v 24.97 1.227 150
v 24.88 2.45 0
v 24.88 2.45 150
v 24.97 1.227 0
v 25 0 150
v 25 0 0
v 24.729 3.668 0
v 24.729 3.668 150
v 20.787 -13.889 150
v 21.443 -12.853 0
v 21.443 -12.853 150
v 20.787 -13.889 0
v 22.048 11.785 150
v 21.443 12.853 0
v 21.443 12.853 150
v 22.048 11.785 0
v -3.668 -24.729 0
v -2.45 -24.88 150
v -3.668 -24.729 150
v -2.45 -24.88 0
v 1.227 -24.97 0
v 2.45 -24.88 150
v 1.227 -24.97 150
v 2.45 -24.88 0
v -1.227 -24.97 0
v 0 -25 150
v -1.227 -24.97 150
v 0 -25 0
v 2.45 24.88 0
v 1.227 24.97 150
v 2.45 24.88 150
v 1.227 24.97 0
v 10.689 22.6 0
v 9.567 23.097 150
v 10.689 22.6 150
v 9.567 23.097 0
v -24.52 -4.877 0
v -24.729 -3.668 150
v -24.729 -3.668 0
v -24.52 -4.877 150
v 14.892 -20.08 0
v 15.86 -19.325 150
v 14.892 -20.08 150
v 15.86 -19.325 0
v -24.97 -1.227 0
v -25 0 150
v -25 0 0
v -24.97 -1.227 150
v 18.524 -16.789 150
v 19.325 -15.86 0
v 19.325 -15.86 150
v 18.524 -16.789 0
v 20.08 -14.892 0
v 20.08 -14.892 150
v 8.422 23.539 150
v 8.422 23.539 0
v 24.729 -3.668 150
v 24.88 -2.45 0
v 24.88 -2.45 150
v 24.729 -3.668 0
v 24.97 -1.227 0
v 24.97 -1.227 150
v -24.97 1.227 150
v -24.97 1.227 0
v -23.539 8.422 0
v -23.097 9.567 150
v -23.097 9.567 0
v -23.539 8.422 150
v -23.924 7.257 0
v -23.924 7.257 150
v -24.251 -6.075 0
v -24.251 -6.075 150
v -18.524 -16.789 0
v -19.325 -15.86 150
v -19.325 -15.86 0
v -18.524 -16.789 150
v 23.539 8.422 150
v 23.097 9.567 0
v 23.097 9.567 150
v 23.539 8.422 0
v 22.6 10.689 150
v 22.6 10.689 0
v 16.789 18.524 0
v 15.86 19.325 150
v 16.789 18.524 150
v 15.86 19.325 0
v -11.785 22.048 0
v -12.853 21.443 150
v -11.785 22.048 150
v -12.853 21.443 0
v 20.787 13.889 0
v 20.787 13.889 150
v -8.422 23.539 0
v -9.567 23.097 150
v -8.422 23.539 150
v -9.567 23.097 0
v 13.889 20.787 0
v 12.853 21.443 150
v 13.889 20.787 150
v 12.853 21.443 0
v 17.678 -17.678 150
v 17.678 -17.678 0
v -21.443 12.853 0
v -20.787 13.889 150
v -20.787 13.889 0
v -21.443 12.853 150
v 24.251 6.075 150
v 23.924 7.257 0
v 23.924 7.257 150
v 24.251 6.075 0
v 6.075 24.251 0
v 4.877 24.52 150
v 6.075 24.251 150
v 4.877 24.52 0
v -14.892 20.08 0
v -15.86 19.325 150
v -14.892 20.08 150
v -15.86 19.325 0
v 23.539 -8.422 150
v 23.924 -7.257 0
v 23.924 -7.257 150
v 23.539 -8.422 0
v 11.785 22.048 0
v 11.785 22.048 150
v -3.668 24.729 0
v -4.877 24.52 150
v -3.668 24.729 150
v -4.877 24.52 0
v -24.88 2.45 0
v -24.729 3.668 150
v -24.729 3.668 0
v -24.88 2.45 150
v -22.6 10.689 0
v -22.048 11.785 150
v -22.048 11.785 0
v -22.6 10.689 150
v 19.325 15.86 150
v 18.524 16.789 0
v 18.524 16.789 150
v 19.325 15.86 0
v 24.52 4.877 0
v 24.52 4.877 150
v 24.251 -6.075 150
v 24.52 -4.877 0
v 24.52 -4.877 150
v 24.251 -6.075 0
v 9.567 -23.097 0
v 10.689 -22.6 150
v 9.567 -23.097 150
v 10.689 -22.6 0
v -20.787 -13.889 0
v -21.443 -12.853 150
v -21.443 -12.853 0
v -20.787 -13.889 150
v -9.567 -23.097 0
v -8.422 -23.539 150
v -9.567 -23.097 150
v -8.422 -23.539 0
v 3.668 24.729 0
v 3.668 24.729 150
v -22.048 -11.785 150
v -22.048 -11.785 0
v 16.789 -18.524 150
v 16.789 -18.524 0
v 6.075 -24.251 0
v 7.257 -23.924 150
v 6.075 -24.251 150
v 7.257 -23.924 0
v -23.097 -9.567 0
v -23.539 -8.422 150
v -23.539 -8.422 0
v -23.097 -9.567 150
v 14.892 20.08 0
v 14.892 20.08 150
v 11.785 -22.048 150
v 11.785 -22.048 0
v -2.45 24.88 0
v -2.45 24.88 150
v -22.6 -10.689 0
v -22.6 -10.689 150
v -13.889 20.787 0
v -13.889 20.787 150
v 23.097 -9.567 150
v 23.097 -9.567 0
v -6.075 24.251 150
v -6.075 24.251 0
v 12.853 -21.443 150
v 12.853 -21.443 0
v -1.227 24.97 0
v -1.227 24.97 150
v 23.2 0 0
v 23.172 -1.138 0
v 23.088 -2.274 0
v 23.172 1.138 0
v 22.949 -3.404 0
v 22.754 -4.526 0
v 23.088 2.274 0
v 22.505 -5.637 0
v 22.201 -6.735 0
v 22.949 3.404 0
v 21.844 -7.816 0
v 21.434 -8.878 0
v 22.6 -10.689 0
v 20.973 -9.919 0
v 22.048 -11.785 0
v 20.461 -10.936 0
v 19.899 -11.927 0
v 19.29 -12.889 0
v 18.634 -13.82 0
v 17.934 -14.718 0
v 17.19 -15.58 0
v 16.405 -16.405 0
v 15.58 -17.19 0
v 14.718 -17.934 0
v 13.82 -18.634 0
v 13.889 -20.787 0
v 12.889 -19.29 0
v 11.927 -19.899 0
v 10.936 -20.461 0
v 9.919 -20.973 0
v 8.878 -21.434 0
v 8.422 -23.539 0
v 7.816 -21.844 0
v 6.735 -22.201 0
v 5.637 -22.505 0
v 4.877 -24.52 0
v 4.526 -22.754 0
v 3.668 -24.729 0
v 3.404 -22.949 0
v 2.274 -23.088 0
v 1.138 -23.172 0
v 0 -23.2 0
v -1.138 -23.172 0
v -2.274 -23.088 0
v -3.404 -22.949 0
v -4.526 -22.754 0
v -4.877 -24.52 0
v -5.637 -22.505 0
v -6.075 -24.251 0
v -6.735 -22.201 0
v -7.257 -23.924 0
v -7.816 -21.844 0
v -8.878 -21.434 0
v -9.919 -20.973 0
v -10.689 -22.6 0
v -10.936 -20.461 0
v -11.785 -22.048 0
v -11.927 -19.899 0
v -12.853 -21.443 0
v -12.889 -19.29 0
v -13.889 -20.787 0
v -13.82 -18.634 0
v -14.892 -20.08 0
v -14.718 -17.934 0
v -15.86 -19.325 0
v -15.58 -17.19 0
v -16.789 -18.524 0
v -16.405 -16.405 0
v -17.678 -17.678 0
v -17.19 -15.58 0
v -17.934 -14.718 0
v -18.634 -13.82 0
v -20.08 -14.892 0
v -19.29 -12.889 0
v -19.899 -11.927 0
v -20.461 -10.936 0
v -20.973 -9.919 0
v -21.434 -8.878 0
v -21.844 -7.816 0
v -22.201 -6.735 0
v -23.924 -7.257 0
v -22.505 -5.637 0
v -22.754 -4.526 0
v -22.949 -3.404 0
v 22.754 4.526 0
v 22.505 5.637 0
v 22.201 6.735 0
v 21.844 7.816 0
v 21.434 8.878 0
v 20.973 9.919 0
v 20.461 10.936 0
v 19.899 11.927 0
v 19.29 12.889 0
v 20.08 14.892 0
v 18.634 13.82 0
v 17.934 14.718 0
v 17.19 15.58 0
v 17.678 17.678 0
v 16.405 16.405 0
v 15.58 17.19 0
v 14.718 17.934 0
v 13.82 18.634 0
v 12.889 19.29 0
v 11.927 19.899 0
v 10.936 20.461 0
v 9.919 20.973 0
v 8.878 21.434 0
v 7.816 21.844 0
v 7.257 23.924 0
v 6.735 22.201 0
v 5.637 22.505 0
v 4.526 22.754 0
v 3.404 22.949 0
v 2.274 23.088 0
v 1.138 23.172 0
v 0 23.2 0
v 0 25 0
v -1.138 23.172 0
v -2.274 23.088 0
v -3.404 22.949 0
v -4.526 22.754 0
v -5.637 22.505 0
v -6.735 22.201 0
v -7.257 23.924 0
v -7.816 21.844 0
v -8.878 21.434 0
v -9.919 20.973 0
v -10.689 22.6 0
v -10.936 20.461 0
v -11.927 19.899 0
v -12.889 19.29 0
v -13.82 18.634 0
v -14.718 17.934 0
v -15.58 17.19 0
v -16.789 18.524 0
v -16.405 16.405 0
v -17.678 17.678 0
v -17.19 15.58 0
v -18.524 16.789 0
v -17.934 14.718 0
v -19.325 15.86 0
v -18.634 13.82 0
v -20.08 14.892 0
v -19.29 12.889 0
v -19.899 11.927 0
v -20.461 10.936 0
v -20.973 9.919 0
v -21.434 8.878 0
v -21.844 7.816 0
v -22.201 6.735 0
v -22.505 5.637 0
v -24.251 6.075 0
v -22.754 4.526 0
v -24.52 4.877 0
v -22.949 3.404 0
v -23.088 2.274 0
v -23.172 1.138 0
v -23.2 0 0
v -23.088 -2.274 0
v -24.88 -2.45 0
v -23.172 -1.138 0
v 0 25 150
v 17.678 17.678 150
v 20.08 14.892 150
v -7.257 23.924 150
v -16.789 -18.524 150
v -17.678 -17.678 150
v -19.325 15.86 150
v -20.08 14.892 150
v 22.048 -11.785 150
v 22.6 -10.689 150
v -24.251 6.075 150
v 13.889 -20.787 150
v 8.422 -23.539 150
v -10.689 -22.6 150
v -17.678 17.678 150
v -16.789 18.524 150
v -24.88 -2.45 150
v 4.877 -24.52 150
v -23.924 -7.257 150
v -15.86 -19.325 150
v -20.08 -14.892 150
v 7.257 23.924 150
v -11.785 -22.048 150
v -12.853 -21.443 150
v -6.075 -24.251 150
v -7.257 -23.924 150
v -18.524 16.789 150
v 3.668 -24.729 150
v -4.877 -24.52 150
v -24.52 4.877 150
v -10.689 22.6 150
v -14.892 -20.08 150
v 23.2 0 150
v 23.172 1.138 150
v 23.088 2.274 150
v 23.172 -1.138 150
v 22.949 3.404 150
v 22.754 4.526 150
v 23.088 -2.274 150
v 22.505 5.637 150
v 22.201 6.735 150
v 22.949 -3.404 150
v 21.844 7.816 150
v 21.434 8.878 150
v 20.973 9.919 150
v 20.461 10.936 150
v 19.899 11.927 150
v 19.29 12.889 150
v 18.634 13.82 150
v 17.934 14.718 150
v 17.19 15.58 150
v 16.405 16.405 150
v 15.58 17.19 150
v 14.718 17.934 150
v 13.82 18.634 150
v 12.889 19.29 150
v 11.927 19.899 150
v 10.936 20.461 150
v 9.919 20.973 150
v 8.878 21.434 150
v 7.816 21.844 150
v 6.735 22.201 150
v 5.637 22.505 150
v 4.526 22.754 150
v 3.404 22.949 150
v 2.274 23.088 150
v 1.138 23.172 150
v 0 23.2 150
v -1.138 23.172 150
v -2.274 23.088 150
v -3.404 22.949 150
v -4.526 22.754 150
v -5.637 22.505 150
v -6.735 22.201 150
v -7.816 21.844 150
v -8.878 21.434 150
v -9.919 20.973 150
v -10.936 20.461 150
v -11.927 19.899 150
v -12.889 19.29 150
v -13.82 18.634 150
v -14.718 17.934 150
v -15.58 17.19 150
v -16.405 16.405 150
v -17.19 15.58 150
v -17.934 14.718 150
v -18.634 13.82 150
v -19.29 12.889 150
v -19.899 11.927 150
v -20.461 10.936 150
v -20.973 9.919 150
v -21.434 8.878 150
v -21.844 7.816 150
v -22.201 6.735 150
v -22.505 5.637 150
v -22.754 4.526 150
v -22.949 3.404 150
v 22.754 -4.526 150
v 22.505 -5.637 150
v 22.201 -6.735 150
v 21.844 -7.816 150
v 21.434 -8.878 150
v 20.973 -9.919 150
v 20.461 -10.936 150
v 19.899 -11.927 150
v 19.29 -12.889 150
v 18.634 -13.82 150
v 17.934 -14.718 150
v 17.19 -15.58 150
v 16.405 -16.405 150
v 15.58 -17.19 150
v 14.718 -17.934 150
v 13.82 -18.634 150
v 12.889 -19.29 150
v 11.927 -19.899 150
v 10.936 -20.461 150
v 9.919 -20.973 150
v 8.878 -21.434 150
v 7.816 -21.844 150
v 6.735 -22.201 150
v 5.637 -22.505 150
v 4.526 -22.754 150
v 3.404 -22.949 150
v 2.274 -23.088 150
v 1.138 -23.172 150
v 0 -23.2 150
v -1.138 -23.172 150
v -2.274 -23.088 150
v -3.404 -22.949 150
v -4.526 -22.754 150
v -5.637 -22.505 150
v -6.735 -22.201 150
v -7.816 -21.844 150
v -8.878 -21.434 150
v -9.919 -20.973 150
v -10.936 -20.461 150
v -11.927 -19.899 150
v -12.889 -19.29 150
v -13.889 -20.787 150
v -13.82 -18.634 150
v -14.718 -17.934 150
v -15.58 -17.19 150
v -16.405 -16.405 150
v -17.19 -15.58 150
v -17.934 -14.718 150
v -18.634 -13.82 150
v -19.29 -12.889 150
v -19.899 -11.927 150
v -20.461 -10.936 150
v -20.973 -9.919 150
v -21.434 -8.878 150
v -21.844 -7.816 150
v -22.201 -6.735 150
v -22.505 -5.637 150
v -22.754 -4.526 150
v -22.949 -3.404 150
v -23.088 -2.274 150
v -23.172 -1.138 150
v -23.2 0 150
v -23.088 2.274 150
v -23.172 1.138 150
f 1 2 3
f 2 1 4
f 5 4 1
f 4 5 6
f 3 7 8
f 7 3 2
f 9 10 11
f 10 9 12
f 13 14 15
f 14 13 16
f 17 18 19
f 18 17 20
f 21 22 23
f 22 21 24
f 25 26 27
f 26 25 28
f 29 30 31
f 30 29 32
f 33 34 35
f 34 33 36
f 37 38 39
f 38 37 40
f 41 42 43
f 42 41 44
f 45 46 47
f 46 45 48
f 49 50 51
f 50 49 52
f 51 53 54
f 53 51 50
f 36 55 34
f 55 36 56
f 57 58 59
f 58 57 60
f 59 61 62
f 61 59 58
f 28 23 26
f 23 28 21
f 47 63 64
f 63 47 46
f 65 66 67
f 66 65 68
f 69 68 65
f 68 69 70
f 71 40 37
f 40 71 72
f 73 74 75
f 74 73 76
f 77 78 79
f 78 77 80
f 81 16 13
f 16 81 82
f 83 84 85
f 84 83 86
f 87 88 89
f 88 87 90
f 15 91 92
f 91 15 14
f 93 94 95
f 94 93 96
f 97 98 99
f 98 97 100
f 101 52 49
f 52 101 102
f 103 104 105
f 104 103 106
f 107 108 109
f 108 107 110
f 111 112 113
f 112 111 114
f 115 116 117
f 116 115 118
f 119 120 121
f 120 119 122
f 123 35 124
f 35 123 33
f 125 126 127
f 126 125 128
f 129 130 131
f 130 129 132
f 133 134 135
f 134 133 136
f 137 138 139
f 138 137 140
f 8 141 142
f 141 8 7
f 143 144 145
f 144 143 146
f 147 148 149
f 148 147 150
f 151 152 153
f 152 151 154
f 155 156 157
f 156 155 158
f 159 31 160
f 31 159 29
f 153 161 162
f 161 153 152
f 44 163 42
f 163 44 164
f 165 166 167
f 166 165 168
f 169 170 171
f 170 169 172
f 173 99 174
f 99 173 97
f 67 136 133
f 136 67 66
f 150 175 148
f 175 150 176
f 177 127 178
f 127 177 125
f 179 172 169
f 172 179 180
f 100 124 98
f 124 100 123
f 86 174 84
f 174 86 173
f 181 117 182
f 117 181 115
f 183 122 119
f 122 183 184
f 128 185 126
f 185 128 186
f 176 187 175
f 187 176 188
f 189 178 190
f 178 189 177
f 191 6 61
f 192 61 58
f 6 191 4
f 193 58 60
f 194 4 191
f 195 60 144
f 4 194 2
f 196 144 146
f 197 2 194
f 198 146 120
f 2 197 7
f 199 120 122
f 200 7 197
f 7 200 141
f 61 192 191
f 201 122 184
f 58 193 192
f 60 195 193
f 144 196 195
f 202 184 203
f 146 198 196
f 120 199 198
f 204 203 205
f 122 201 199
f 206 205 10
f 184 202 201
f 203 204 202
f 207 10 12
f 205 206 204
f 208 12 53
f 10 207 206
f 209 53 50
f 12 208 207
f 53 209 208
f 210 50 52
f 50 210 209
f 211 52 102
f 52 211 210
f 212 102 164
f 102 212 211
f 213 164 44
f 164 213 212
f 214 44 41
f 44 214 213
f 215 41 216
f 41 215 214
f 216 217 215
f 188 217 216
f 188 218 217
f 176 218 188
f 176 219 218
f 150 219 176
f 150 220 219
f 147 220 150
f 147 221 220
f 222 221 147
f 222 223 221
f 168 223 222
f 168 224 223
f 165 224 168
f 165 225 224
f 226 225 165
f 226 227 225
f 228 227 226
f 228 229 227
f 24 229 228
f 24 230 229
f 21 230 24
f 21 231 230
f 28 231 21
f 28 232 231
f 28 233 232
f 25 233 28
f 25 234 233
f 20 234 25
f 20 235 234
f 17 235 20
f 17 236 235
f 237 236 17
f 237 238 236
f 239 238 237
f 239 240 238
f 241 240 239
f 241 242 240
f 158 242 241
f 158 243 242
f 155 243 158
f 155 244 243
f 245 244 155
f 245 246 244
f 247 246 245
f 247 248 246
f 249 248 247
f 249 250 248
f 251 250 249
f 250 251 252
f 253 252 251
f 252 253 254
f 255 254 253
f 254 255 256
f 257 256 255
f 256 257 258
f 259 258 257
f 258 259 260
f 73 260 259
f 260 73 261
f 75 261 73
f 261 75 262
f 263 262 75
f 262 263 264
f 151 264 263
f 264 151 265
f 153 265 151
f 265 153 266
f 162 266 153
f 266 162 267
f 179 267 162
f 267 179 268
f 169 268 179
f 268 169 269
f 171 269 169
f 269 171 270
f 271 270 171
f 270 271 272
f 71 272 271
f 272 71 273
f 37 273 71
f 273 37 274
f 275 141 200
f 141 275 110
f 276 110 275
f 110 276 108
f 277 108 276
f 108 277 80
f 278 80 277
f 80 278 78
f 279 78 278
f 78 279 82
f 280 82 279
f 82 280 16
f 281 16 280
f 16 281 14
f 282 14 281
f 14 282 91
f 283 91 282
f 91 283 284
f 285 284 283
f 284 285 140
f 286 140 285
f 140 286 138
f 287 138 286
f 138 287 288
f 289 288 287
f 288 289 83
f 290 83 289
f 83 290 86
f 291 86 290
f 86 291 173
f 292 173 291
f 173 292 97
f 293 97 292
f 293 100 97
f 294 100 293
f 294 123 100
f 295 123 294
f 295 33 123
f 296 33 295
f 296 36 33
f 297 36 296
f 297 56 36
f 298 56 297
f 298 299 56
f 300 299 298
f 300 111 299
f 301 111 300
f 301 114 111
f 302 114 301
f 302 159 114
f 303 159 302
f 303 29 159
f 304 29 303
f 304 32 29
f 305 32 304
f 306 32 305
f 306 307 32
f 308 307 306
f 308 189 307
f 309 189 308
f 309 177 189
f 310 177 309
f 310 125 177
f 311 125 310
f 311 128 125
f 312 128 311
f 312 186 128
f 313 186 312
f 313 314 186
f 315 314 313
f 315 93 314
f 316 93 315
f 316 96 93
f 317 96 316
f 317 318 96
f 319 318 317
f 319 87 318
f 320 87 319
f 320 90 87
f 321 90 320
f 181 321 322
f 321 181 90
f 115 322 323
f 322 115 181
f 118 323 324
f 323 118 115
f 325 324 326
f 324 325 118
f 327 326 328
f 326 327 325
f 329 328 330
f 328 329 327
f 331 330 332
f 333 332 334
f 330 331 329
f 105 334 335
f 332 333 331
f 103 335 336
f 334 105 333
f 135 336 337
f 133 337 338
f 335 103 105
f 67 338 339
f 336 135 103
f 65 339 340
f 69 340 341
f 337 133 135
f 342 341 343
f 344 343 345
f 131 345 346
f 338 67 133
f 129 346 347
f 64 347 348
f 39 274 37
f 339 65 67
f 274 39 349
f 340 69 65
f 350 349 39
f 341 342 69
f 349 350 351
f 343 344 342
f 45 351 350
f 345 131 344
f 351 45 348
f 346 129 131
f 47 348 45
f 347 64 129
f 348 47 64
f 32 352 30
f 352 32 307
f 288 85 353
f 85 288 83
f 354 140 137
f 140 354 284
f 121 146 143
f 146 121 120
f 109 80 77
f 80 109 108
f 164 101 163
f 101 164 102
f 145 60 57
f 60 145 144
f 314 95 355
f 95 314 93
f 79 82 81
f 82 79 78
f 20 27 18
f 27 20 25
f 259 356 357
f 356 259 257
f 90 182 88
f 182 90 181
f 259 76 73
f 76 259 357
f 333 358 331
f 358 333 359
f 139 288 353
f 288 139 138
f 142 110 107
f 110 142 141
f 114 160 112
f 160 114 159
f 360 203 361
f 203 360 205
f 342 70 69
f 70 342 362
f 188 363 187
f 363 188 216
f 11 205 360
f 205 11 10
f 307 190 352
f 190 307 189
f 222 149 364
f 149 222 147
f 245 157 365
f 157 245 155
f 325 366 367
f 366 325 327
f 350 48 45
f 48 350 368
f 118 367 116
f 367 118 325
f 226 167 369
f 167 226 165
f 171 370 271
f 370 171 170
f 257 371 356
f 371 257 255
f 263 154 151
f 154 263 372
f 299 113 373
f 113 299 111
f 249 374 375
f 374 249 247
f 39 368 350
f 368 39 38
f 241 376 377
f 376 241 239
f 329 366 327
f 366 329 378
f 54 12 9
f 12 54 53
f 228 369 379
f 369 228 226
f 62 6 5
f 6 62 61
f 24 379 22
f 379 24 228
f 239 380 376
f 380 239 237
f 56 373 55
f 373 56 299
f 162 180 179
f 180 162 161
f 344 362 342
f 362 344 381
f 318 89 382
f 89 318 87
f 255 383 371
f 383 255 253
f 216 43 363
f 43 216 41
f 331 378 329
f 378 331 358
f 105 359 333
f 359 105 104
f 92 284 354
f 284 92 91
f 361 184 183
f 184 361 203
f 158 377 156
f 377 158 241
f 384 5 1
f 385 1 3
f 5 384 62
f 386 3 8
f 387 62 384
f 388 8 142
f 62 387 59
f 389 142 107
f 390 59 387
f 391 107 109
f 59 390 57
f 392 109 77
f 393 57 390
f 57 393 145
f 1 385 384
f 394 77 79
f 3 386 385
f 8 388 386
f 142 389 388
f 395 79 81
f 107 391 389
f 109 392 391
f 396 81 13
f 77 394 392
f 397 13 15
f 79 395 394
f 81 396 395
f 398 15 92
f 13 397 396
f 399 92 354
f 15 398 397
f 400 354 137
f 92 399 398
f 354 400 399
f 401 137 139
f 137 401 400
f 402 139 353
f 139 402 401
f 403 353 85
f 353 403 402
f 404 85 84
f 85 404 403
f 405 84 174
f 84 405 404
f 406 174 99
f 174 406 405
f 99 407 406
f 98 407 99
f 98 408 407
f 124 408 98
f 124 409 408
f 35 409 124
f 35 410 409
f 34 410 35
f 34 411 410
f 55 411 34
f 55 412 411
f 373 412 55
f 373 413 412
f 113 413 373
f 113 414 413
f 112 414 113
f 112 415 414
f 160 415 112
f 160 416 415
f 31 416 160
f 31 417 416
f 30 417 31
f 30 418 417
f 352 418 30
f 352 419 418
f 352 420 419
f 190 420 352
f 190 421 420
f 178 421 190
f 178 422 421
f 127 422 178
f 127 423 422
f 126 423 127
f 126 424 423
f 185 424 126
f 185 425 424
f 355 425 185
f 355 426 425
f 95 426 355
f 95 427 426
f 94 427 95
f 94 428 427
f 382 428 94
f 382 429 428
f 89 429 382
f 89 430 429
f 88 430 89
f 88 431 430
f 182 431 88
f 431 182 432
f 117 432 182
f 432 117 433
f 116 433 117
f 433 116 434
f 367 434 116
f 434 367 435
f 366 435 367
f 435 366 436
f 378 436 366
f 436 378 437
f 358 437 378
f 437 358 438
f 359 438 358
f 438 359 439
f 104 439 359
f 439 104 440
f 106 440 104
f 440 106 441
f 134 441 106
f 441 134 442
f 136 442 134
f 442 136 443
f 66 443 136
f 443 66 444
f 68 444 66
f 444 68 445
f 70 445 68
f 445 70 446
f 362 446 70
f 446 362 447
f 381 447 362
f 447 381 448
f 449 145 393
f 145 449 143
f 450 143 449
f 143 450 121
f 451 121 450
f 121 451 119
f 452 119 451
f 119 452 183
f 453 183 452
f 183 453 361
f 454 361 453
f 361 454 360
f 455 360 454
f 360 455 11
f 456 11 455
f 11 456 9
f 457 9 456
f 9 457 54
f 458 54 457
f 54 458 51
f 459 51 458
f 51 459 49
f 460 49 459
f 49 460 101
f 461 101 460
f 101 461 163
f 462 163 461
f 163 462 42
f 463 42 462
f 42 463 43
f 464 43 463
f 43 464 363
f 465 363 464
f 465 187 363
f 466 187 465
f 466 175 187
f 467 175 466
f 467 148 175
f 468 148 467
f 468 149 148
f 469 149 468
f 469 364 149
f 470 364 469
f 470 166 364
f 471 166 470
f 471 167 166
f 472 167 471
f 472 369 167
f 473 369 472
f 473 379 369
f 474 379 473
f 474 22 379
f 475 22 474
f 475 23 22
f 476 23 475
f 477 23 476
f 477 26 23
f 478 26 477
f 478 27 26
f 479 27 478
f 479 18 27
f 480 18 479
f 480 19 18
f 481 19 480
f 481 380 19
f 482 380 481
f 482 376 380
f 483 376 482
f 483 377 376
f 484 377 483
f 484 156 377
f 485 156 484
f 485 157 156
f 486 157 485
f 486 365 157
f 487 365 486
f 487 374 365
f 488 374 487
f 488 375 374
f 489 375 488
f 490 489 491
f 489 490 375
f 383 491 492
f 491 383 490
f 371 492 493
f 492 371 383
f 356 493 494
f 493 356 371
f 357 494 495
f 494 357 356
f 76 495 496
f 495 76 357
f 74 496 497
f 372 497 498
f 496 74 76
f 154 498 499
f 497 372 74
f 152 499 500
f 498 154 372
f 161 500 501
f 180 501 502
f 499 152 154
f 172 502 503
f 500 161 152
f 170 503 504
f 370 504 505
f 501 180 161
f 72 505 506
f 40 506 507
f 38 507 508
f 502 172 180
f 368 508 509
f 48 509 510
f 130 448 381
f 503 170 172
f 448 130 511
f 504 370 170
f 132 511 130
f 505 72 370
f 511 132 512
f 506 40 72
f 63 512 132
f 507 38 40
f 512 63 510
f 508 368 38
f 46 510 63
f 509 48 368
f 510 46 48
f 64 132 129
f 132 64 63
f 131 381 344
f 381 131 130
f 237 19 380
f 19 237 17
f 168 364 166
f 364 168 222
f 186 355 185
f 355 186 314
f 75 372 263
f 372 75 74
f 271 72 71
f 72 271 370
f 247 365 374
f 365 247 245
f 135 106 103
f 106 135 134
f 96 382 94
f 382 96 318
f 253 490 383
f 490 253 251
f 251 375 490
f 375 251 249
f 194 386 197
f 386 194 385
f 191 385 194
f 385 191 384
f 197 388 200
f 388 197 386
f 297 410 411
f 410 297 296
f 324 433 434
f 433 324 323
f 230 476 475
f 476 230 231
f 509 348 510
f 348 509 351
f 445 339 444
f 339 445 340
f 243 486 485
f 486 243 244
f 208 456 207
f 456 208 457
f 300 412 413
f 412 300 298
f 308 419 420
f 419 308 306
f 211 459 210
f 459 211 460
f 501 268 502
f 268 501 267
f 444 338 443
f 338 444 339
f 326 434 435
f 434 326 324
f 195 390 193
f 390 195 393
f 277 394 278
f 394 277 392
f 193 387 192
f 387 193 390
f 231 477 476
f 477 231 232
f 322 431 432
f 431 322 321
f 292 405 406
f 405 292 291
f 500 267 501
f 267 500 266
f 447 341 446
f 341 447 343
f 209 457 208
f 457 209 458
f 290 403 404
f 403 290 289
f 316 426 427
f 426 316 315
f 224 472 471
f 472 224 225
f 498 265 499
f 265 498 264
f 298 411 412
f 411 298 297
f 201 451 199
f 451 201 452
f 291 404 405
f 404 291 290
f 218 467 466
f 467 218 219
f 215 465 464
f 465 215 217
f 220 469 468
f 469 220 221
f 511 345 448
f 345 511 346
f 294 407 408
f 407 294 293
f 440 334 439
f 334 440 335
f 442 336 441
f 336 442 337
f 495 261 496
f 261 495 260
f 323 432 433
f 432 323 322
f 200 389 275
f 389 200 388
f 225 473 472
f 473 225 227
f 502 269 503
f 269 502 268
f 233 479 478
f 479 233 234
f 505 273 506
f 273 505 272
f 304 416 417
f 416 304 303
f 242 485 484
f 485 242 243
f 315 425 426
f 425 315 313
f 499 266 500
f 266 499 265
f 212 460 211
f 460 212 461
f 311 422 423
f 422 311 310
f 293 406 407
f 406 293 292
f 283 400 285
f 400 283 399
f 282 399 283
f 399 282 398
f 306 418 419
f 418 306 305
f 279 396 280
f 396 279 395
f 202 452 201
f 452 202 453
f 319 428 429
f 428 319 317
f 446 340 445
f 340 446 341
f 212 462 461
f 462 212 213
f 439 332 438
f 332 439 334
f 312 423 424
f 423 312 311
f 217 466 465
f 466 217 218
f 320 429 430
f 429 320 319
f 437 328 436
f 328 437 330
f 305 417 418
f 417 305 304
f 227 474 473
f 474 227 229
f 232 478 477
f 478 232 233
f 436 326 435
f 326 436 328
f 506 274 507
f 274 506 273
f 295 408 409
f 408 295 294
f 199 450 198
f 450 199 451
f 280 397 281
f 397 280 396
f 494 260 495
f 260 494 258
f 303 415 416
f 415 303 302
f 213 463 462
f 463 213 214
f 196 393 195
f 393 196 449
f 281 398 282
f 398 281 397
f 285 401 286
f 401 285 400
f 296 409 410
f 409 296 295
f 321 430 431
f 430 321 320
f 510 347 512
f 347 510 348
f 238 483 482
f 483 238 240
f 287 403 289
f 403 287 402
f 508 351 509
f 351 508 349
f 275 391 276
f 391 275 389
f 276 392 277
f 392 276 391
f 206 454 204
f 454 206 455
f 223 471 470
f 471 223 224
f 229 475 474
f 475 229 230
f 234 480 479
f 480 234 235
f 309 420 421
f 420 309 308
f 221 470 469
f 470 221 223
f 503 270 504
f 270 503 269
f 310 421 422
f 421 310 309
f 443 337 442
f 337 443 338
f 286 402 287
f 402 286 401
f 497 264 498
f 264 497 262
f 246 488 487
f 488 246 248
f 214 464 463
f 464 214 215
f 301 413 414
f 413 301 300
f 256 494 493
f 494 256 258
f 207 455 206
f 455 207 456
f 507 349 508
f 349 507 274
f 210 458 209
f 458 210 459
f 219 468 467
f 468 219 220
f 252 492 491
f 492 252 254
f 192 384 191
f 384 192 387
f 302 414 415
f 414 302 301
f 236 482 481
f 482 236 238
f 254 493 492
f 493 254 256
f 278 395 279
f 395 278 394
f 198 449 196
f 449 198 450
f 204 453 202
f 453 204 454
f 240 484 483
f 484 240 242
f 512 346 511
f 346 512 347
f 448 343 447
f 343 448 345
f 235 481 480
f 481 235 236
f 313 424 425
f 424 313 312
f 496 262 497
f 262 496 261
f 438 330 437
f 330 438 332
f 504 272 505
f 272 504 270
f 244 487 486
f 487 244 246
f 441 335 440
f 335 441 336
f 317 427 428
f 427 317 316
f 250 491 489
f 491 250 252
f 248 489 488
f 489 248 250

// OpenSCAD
$fn = 128;

// HT pipe parameters (approx. for HT 50)
pipe_length = 150;          // mm
outer_diameter = 50;        // mm (nominal)
wall_thickness = 1.8;       // mm (typical HT pipe wall)
inner_diameter = outer_diameter - 2*wall_thickness;

module ht_pipe(od, id, len) {
    difference() {
        cylinder(h = len, d = od);
        translate([0,0,-0.1])
            cylinder(h = len + 0.2, d = id);
    }
}

ht_pipe(outer_diameter, inner_diameter, pipe_length);
